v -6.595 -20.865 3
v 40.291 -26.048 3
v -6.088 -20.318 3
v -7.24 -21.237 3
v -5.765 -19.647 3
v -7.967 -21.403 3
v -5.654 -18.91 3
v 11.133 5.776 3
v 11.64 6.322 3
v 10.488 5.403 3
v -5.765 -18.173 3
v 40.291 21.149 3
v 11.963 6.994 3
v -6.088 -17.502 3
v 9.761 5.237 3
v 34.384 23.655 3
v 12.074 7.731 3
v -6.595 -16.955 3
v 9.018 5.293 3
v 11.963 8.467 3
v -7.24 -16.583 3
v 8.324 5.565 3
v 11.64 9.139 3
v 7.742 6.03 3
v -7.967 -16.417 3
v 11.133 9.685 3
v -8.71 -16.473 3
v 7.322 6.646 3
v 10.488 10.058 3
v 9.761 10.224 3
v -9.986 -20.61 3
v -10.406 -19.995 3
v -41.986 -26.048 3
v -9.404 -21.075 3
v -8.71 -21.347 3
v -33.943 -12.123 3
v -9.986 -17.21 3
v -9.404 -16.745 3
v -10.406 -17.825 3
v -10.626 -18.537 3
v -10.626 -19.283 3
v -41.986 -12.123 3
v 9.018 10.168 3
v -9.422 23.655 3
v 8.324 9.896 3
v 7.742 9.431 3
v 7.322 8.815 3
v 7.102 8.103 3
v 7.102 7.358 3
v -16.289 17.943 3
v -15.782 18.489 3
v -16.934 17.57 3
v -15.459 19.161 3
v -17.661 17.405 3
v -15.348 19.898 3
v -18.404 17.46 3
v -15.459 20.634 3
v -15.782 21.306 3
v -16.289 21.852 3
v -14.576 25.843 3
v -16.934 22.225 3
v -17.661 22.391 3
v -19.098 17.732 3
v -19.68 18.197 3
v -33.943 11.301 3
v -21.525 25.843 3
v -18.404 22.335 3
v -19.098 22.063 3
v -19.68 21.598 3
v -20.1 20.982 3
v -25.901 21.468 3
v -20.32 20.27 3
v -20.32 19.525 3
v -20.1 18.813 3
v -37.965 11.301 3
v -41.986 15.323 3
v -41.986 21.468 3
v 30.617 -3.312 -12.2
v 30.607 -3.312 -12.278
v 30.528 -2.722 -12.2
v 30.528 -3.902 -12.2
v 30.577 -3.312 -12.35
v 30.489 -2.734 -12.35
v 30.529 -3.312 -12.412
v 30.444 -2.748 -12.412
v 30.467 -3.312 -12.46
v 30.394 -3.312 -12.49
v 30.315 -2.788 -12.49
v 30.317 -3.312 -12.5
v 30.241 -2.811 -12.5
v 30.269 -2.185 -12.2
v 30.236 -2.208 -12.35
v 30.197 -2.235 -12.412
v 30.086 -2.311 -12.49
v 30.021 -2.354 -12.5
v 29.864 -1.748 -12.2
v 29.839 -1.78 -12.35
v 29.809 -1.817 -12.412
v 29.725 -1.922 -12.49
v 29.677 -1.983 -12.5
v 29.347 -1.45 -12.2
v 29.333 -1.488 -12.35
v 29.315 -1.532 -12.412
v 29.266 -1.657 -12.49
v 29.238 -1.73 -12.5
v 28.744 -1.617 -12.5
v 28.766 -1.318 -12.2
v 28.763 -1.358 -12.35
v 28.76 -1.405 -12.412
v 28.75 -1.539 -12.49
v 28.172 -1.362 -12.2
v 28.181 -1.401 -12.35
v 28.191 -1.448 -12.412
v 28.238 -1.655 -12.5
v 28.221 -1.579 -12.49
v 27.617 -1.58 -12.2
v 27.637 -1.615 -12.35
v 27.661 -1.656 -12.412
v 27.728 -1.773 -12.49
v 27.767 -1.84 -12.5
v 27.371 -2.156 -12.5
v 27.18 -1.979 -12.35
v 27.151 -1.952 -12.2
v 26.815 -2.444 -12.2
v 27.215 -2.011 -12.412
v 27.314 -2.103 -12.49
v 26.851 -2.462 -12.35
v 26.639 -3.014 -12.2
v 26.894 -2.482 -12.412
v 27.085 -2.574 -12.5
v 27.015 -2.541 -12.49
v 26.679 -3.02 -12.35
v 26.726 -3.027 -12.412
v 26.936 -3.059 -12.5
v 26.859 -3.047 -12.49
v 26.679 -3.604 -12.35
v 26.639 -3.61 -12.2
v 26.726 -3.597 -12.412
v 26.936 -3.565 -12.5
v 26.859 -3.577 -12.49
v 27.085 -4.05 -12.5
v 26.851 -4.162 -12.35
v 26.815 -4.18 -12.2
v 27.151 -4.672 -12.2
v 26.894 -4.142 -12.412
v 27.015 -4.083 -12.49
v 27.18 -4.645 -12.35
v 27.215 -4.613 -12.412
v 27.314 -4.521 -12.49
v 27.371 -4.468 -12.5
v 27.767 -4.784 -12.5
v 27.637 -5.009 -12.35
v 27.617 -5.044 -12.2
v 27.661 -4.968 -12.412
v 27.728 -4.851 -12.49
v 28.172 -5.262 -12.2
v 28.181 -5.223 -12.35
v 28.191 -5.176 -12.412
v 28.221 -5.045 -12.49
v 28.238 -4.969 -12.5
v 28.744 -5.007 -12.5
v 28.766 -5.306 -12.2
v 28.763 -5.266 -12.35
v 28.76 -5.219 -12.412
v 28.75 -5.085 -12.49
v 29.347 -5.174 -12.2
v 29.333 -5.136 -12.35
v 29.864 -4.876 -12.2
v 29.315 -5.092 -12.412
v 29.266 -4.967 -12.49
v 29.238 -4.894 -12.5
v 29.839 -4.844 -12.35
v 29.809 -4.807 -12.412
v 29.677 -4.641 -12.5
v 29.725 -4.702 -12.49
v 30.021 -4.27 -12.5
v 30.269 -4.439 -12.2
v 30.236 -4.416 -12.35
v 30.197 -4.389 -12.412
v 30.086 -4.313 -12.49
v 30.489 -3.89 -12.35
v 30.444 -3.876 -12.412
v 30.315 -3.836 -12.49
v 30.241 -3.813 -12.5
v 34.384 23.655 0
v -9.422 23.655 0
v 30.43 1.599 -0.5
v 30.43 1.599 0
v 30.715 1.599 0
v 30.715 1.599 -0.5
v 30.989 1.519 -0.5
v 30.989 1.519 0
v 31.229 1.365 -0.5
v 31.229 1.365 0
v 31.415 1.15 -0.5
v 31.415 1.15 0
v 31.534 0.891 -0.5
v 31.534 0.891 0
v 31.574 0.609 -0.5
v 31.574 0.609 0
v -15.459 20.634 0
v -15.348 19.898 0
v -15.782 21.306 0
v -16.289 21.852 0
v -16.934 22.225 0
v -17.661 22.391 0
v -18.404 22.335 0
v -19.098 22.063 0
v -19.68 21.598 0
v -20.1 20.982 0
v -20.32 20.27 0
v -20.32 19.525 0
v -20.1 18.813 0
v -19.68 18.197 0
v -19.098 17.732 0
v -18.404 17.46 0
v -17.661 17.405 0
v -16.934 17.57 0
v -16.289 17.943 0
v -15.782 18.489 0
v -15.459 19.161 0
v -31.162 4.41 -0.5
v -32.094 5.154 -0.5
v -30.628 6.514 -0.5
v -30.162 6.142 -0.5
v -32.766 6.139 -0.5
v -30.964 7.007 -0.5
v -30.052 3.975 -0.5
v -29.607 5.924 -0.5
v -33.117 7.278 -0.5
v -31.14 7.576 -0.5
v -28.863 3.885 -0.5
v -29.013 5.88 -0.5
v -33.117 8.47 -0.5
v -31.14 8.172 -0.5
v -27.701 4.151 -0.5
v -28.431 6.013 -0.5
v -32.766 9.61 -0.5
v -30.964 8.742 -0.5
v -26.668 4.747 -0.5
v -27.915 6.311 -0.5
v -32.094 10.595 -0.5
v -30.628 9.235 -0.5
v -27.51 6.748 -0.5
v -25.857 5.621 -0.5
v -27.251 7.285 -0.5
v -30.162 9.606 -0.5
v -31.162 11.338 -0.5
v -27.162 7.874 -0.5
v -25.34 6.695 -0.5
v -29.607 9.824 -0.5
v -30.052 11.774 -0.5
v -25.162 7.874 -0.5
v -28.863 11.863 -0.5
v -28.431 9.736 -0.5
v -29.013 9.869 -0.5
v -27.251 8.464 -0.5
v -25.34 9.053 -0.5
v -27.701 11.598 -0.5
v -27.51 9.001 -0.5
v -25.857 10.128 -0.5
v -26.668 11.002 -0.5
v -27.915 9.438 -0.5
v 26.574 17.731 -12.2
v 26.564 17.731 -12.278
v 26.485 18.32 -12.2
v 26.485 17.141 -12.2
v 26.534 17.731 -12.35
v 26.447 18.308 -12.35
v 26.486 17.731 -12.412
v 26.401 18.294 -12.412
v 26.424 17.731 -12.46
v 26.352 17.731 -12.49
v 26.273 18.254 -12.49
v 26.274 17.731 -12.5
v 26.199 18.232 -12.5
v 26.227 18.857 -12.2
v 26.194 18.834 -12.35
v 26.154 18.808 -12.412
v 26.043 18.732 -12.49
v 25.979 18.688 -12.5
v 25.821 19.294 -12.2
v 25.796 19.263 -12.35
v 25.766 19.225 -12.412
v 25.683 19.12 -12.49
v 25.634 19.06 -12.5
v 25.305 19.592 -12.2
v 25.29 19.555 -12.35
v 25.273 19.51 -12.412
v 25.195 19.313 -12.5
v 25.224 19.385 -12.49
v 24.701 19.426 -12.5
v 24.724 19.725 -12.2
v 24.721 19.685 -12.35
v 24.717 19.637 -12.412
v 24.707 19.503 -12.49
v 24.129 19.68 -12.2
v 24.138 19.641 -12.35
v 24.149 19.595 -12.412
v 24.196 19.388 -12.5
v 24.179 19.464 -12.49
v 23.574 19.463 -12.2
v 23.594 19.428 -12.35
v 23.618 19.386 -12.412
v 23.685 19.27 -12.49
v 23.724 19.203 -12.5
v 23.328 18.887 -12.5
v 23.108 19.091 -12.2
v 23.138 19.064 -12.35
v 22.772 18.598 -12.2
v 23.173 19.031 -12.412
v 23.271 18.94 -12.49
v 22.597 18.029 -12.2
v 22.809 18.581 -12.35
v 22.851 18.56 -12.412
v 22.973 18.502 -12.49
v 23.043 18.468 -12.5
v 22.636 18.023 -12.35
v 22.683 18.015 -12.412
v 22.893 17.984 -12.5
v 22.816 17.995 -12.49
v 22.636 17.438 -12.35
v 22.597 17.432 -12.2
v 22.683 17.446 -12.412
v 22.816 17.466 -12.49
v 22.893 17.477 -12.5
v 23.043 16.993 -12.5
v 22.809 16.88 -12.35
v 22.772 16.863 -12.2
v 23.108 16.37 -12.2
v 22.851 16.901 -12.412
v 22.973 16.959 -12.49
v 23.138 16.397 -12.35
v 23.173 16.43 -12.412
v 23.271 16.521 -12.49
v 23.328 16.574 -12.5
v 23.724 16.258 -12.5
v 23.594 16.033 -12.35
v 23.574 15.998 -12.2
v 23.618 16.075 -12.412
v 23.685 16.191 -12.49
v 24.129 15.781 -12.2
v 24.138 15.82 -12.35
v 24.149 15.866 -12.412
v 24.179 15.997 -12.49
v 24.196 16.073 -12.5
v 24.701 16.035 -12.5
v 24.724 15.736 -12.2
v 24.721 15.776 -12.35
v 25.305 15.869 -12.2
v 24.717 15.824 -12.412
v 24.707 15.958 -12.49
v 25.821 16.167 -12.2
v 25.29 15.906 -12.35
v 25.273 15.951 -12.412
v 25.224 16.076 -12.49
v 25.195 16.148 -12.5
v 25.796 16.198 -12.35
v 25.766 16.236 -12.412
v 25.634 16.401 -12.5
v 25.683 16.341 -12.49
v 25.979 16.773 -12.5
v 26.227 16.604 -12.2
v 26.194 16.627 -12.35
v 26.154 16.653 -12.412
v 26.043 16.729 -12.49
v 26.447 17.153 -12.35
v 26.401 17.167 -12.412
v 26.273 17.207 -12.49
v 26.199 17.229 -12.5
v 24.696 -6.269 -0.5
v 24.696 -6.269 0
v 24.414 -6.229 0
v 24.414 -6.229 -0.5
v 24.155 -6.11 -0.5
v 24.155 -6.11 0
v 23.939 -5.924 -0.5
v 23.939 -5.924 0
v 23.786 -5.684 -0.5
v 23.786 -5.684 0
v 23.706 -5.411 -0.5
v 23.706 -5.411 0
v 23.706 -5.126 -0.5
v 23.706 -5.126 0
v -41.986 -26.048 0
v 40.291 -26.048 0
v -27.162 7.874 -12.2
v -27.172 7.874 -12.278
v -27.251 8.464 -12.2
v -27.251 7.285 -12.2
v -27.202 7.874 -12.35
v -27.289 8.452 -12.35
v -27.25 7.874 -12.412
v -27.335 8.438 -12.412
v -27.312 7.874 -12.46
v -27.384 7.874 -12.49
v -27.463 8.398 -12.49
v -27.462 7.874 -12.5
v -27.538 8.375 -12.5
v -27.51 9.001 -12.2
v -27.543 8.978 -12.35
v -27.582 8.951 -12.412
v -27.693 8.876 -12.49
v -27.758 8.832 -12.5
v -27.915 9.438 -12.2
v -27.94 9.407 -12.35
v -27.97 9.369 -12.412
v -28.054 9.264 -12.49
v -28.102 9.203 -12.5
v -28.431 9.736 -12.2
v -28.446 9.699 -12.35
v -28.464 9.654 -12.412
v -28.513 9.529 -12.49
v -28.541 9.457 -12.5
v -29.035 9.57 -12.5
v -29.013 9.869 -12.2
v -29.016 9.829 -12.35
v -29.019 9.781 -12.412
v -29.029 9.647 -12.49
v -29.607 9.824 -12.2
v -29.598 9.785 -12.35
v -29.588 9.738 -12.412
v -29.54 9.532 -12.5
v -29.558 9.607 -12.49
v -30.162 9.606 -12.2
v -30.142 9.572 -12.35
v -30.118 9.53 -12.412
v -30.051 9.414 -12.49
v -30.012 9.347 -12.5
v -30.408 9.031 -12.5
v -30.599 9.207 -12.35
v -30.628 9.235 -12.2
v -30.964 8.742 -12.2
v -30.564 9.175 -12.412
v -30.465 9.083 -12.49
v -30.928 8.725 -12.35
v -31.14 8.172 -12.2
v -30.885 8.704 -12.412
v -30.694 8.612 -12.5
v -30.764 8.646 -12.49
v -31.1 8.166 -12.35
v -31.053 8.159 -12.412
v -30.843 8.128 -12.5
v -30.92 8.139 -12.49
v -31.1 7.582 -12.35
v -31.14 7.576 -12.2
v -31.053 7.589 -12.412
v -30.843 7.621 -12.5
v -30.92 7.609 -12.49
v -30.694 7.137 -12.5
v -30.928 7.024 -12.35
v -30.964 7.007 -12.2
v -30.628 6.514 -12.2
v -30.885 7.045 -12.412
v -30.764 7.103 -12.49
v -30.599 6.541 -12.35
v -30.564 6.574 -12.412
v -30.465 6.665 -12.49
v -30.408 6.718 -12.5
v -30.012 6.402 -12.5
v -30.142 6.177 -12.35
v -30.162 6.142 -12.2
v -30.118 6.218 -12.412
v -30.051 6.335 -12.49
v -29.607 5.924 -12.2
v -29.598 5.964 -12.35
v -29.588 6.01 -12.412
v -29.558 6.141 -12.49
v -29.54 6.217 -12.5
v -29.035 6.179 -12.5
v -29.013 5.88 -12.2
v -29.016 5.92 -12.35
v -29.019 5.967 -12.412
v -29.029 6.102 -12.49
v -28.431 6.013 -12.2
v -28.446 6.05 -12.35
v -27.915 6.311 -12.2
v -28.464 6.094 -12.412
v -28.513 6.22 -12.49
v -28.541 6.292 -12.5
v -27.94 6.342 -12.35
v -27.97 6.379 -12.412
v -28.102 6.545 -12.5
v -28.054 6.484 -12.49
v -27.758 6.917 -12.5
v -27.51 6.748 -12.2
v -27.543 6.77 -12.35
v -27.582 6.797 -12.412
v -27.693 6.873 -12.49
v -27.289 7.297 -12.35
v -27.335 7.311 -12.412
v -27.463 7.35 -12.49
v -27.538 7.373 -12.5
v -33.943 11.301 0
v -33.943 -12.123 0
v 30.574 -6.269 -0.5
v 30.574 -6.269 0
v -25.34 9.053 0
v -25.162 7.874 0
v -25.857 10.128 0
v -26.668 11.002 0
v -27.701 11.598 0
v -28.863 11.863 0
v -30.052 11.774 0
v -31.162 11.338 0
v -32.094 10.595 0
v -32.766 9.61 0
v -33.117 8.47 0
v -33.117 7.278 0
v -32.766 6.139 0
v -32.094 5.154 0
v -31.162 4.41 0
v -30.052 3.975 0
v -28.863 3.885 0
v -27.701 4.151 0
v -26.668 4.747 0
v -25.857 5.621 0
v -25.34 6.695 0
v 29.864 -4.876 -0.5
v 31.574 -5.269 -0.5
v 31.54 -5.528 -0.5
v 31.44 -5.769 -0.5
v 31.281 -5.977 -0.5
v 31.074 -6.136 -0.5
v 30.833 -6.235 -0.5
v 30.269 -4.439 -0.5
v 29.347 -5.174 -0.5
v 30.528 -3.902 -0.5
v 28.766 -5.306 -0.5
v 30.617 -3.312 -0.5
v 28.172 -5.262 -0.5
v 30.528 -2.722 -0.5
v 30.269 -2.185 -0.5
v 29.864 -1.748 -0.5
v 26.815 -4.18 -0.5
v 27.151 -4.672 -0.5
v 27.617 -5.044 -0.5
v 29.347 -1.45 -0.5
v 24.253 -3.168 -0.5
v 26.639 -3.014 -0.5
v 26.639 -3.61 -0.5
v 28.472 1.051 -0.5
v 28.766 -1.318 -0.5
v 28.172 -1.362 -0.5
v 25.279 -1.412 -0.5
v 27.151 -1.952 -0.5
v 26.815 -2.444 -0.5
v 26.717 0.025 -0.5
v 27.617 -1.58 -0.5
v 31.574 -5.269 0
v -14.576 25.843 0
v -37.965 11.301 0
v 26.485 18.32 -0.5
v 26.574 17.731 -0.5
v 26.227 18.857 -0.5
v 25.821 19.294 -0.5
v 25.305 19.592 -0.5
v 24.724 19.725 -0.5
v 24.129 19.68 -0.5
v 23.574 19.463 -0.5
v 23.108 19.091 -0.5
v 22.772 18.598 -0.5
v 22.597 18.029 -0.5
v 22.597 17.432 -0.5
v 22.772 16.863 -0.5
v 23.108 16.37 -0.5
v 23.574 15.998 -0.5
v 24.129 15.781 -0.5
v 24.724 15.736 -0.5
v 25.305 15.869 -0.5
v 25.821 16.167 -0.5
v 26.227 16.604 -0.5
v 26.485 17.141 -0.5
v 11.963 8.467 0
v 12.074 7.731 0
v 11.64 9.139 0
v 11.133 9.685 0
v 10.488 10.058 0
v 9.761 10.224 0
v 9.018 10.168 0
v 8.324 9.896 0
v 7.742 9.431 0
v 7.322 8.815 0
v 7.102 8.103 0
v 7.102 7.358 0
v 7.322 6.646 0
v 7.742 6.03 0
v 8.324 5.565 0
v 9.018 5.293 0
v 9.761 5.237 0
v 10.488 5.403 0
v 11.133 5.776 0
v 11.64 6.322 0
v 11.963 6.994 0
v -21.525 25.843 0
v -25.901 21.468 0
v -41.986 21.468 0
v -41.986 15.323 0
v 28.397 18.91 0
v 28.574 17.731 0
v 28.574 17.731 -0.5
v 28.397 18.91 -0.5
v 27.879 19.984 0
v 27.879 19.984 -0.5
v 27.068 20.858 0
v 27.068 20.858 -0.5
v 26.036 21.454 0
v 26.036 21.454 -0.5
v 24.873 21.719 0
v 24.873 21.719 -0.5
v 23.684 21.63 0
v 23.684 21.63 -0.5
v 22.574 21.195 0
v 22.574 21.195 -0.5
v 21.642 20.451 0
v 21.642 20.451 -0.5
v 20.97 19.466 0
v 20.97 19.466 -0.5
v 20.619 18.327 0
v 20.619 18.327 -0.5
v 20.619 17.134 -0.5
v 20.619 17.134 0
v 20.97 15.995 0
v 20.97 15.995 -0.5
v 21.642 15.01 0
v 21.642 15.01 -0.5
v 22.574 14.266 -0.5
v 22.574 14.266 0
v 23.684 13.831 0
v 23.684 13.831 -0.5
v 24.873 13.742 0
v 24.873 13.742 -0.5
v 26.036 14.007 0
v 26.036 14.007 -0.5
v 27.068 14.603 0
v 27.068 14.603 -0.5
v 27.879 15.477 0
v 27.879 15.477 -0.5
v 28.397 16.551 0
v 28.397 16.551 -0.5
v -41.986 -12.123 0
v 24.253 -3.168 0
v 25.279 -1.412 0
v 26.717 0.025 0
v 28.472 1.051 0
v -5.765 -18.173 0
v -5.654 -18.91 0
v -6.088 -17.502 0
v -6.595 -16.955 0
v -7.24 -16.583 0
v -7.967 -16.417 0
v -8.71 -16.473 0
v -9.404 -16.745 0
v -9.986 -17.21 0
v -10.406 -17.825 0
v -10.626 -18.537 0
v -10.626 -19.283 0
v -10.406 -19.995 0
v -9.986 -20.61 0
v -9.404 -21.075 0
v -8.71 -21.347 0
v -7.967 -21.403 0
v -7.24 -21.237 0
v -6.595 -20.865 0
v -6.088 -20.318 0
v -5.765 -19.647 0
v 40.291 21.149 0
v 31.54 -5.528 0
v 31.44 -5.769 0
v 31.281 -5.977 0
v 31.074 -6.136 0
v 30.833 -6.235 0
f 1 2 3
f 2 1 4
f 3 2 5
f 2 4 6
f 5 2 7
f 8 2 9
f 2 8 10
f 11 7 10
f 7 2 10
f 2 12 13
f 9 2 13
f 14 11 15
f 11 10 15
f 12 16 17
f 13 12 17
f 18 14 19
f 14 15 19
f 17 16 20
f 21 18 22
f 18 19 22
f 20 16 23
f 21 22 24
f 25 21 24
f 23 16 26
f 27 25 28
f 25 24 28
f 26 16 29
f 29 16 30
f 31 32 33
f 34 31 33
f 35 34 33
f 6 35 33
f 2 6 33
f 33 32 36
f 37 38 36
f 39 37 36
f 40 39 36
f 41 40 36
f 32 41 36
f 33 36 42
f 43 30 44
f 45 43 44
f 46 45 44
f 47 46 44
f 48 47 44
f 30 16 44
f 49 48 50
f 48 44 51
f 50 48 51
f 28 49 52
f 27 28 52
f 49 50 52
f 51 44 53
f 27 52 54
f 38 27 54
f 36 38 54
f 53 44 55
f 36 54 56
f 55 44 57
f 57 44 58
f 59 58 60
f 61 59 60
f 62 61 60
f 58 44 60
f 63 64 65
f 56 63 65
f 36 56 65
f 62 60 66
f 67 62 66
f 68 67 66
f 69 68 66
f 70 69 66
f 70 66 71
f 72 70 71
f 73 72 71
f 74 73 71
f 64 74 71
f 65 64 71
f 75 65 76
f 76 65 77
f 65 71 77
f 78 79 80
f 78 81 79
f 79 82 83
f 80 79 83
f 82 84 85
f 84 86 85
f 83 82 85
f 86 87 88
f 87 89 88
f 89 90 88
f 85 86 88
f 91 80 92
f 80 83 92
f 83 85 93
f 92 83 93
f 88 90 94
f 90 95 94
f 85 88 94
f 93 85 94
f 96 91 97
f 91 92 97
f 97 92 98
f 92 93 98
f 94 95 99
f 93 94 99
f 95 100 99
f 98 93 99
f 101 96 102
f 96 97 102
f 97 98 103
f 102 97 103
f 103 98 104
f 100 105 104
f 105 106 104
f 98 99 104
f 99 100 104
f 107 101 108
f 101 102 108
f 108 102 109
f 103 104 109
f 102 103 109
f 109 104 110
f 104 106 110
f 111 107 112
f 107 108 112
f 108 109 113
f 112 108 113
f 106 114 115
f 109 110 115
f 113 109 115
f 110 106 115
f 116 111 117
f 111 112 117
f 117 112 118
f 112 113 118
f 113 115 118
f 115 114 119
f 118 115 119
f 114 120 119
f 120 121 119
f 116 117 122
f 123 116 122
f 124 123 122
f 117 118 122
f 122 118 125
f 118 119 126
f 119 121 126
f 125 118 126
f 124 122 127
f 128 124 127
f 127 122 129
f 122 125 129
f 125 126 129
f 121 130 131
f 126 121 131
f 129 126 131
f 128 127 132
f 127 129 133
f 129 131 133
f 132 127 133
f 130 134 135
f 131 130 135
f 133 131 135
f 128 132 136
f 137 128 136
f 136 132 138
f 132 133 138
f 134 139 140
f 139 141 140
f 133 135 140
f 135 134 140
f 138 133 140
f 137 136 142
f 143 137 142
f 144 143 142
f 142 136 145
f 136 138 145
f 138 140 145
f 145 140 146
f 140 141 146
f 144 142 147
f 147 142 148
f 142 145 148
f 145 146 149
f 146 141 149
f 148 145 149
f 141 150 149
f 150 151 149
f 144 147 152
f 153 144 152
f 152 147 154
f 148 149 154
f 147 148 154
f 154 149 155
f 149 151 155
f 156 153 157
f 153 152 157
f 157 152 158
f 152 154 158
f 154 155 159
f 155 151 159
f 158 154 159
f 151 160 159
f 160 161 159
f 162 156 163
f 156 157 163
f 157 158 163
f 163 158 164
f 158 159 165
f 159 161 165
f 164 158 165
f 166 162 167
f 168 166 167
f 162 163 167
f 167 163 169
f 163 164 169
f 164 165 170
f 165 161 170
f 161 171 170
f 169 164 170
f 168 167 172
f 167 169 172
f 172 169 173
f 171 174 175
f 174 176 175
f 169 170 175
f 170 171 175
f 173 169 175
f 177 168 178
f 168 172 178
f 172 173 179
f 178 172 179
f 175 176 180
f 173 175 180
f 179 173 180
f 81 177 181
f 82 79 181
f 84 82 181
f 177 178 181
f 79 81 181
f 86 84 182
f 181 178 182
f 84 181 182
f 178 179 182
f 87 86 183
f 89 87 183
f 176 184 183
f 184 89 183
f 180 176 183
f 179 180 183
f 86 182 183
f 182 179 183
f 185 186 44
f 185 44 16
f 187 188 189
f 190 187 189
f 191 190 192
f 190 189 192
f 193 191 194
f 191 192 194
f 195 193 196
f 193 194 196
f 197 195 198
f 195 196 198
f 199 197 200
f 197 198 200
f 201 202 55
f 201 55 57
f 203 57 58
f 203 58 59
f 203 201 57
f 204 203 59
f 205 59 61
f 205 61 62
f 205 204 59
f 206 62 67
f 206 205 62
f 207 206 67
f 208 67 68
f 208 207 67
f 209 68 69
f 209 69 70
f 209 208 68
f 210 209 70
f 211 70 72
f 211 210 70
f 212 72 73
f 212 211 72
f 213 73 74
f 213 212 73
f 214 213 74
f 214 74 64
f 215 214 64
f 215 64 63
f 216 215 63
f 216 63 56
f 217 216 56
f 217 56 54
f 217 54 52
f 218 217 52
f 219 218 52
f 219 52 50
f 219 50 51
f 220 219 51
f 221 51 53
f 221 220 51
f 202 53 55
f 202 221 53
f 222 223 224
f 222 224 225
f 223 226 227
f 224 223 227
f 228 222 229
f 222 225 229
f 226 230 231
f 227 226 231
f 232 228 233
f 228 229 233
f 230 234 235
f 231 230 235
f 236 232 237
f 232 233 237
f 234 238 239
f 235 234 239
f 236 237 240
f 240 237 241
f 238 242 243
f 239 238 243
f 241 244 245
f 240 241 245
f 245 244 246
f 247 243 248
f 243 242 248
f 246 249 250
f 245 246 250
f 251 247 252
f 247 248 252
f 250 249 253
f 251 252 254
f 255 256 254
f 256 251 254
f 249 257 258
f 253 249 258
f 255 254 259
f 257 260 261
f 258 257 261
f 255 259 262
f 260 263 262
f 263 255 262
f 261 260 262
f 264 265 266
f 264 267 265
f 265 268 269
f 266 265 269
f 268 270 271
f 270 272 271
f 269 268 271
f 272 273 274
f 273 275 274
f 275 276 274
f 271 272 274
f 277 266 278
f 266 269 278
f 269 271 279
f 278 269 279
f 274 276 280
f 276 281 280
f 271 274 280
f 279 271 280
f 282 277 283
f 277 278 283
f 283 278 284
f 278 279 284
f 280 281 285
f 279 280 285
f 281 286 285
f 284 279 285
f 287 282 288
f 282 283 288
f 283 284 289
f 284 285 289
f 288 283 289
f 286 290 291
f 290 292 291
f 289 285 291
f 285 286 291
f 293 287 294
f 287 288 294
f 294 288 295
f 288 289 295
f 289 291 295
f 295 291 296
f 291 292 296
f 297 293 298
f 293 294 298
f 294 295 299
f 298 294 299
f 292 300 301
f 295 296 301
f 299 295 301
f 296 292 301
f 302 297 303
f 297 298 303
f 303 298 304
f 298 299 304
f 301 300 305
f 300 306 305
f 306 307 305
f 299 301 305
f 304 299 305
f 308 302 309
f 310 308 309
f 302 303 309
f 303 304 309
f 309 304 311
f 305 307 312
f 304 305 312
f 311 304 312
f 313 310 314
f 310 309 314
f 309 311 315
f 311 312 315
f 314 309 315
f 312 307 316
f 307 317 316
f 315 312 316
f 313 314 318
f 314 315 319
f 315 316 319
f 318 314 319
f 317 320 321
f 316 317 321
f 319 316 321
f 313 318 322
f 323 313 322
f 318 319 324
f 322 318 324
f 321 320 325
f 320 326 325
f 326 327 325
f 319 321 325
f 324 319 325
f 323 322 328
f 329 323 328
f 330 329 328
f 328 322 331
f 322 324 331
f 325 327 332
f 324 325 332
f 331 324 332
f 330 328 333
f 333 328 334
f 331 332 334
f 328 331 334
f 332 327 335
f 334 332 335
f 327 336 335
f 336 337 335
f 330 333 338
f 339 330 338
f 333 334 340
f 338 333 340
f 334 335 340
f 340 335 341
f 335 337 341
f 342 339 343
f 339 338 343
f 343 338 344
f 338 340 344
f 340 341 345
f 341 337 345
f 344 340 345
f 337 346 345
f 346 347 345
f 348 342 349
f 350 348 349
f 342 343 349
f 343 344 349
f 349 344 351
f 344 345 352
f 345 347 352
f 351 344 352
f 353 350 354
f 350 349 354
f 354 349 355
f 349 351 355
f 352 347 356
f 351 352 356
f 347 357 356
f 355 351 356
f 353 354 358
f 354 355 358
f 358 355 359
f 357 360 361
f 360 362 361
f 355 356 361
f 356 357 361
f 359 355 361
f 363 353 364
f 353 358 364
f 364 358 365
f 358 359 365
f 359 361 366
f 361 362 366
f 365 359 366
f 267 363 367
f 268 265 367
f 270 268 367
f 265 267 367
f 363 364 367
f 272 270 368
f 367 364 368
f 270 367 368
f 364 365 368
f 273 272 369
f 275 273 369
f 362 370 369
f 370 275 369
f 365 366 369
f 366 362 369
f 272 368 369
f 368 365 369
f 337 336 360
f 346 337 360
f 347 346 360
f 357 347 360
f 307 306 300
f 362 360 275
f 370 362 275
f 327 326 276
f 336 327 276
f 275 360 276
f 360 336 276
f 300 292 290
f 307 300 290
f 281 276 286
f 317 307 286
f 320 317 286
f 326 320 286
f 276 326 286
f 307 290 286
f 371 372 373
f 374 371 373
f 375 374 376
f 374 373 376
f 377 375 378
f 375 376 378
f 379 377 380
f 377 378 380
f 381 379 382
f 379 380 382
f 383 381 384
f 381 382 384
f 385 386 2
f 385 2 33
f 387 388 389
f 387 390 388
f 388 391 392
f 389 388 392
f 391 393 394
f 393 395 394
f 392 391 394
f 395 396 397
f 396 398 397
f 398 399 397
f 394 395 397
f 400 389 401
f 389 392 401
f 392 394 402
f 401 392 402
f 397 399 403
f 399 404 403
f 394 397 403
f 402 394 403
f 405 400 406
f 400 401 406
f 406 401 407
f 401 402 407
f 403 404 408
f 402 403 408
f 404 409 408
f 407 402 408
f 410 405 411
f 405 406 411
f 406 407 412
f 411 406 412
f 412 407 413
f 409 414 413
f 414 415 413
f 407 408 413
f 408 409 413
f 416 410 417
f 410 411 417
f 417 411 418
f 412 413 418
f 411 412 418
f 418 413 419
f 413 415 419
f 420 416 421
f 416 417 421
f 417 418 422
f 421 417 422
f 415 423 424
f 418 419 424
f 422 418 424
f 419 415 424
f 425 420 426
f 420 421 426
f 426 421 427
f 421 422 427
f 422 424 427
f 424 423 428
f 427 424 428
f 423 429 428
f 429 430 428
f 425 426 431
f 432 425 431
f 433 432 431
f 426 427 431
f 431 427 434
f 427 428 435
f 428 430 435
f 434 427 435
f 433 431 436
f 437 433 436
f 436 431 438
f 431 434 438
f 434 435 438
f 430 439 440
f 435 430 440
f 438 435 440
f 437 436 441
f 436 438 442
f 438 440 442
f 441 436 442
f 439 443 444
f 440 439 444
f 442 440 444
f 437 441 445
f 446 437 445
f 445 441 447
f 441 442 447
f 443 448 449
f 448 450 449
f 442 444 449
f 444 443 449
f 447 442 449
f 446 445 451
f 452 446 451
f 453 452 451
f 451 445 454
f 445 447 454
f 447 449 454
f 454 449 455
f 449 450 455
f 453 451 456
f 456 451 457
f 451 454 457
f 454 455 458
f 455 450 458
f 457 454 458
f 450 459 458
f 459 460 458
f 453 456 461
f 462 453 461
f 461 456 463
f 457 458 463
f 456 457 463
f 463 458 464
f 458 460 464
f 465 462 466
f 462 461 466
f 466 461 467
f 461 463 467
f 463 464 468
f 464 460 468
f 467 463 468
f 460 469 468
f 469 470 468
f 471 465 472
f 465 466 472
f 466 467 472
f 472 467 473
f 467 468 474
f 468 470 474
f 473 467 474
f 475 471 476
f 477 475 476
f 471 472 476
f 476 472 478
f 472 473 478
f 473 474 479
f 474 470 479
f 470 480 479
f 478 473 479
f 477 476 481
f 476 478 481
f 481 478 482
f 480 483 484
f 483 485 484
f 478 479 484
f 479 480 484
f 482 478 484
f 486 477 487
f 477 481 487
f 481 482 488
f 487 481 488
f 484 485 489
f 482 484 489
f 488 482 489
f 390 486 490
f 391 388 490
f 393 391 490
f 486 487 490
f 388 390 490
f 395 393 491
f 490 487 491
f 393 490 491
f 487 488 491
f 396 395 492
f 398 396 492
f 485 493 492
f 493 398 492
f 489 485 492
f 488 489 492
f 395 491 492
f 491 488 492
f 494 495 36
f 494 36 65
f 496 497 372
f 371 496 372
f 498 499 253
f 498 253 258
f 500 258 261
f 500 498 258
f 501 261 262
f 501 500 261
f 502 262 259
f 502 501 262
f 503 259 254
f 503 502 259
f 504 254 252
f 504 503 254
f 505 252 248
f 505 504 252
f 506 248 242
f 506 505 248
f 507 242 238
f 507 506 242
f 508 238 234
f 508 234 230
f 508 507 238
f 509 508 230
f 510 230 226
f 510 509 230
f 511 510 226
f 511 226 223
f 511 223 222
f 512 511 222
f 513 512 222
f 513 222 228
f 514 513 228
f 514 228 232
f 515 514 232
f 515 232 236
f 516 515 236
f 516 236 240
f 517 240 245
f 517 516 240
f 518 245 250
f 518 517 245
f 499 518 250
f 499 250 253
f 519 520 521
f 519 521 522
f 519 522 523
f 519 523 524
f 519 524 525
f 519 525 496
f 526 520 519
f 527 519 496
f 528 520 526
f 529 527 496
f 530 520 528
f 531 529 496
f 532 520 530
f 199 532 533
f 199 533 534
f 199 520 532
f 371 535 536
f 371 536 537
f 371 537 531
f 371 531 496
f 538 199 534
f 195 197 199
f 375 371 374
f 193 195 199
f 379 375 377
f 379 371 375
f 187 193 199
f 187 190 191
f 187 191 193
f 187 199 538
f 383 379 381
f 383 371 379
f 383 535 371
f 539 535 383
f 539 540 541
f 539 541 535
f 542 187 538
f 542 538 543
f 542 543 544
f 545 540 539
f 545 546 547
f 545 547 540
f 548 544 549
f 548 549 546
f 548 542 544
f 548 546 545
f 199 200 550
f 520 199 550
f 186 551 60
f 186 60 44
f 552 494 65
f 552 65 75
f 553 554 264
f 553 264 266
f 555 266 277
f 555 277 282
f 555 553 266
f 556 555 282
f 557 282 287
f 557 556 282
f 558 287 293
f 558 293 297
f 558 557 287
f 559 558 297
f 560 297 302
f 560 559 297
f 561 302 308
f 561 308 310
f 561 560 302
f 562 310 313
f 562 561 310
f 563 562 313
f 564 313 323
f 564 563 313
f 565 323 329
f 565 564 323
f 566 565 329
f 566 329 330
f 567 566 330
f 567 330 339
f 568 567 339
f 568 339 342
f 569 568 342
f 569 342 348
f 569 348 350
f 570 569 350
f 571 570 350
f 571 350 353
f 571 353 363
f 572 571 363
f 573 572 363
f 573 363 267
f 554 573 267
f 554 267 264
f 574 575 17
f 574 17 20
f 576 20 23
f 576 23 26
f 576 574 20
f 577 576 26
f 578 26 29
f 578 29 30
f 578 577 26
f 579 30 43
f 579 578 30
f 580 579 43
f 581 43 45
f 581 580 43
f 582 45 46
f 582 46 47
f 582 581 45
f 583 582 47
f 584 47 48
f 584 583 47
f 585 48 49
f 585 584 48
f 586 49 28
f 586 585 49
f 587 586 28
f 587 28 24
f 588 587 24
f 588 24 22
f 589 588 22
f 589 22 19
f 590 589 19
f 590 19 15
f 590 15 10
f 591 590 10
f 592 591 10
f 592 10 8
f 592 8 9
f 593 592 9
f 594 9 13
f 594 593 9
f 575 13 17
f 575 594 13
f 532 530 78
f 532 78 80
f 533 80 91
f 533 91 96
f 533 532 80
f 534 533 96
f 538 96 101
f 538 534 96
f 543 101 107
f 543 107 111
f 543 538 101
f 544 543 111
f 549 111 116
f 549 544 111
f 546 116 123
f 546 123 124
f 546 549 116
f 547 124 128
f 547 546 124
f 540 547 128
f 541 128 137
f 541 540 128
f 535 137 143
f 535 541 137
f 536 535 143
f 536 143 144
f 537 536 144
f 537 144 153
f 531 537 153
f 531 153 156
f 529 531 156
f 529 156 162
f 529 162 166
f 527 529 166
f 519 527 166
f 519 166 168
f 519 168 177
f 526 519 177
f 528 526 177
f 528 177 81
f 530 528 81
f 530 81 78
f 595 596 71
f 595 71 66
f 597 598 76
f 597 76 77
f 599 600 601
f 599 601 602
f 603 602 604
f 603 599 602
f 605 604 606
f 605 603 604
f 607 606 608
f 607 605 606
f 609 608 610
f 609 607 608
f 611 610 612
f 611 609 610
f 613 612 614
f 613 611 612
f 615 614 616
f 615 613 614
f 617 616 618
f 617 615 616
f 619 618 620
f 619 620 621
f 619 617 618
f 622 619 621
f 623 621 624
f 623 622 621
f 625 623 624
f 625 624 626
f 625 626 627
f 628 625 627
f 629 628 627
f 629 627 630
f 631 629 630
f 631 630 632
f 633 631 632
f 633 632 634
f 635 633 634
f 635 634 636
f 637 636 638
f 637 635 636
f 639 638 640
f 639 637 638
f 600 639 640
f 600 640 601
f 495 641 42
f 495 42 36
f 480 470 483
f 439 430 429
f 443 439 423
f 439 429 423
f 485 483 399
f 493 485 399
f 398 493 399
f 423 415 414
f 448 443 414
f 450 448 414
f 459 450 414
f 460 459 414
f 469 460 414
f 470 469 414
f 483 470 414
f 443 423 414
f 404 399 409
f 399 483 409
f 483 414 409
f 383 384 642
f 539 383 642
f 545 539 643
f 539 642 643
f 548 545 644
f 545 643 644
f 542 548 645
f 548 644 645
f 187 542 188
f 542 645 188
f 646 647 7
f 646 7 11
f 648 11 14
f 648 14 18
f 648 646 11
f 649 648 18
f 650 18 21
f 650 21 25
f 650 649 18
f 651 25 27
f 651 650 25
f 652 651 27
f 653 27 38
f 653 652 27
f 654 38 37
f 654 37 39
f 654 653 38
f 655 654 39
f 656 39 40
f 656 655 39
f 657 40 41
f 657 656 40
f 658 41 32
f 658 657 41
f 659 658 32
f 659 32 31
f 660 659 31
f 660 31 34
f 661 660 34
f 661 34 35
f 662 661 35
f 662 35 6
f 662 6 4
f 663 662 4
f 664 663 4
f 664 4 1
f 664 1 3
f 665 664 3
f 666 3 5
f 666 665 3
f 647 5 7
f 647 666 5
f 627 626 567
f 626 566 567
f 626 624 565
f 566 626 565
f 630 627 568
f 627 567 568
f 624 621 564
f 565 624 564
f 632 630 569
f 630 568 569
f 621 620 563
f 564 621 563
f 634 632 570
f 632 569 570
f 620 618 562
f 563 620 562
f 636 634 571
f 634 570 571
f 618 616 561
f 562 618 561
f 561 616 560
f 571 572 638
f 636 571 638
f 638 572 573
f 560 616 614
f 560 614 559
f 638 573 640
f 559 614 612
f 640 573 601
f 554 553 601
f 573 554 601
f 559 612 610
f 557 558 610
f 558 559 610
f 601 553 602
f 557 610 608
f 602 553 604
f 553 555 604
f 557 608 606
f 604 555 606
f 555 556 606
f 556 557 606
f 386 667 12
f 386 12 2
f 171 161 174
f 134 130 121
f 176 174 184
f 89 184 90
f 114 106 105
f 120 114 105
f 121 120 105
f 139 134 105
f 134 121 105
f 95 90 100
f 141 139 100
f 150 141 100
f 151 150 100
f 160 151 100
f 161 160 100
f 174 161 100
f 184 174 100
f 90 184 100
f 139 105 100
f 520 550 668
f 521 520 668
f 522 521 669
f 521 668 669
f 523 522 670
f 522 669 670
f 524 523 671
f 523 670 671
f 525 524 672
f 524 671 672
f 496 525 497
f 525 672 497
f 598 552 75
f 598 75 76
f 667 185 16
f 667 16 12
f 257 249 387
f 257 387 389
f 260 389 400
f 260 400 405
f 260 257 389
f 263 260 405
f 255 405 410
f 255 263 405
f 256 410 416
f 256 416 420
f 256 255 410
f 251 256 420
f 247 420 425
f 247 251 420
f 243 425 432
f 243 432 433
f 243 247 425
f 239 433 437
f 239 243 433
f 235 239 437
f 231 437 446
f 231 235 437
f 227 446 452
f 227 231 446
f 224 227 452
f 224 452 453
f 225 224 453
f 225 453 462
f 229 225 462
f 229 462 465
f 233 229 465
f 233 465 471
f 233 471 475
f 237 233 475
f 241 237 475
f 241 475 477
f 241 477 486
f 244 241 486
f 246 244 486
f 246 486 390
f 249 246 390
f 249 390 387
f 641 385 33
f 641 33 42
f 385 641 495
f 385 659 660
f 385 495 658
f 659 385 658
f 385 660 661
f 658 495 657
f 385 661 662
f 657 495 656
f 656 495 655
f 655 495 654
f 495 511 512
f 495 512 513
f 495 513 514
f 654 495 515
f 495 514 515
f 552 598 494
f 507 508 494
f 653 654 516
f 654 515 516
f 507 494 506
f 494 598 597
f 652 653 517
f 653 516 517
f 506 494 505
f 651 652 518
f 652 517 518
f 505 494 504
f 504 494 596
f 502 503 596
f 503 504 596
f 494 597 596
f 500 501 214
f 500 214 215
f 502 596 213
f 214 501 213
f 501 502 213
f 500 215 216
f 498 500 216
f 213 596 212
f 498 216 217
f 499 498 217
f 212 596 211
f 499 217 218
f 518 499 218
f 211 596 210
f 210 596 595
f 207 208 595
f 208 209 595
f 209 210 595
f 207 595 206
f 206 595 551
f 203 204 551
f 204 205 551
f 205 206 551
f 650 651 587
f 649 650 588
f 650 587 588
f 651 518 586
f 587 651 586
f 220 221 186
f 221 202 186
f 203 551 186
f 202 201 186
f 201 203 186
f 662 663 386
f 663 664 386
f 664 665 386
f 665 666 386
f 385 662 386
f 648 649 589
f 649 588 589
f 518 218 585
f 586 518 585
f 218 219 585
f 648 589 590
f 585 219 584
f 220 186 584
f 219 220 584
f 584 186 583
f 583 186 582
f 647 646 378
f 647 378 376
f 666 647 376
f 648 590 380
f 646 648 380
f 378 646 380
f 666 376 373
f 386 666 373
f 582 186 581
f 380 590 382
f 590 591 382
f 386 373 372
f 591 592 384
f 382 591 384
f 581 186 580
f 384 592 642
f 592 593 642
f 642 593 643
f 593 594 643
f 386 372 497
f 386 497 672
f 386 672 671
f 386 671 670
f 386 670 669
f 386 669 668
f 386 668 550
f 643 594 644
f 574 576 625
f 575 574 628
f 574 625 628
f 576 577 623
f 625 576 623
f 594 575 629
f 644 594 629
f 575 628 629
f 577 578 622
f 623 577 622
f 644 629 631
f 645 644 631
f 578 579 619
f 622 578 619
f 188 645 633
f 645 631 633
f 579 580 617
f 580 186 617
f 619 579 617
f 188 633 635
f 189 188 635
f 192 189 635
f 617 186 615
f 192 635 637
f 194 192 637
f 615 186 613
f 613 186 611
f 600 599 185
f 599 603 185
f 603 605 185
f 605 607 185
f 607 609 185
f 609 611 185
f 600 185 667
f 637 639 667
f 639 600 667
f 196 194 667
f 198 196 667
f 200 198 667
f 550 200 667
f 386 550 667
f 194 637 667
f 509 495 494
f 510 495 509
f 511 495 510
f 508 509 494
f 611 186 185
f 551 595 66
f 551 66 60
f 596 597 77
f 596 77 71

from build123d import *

# Parameters (mm, degrees)
SKETCH_2_R       = 2.5
EXTRUDE_11_DEPTH = 3
SKETCH_2_16_R    = 2
SKETCH_2_16_R_2  = 4
EXTRUDE_12_DEPTH = 0.5
SKETCH_2_17_R    = 2
EXTRUDE_13_DEPTH = 12.5
FILLET_1_R       = 0.3


with BuildPart() as part:
    # 스케치2 → 보스-돌출11 (new body)
    with BuildSketch(Plane.XY):
        Polygon((-25.900833035, 21.467672234), (-41.985987982, 21.467672234), (-41.985987982, 15.322651266), (-37.964699246, 11.301362529), (-33.943410509, 11.301362529), (-33.943410509, -12.123358681), (-41.985987982, -12.123358681), (-41.985987982, -26.048068749), (40.290588771, -26.048068749), (40.290588771, 21.148605879), (34.384238258, 23.655411353), (-9.421808725, 23.655411353), (-14.576398582, 25.843150472), (-21.525354797, 25.843150472), align=None)
        with Locations((-8.153758739, -18.910029411)):
            Circle(SKETCH_2_R, mode=Mode.SUBTRACT)
        with Locations((-17.847699606, 19.897540861)):
            Circle(SKETCH_2_R, mode=Mode.SUBTRACT)
        with Locations((9.574246485, 7.73050044)):
            Circle(SKETCH_2_R, mode=Mode.SUBTRACT)
    extrude(amount=EXTRUDE_11_DEPTH)

    # 스케치2<16> → 보스-돌출12 (add)
    # profile 1 of 3: a face of its own
    with BuildSketch(Plane.XY):
        with BuildLine():
            ThreePointArc((23.706105599, -5.125632338), (23.939439675, -5.923767386), (24.695702599, -6.26949956))
            Line((24.695702599, -6.26949956), (30.574246485, -6.26949956))
            ThreePointArc((30.574246485, -6.26949956), (31.281353266, -5.976606341), (31.574246485, -5.26949956))
            Line((31.574246485, -5.26949956), (31.574246485, 0.609044326))
            ThreePointArc((31.574246485, 0.609044326), (31.228514311, 1.365307251), (30.430379263, 1.598641326))
            ThreePointArc((30.430379263, 1.598641326), (25.952143977, -0.647397052), (23.706105599, -5.125632338))
        make_face()
        with Locations((28.616748621, -3.312001696)):
            Circle(SKETCH_2_16_R, mode=Mode.SUBTRACT)
    # profile 2 of 3: a face of its own
    with BuildSketch(Plane.XY):
        with Locations((-29.162107176, 7.874269984)):
            Circle(SKETCH_2_16_R_2)
        with Locations((-29.162107176, 7.874269984)):
            Circle(SKETCH_2_16_R, mode=Mode.SUBTRACT)
    # profile 3 of 3: a face of its own
    with BuildSketch(Plane.XY):
        with Locations((24.574246485, 17.73050044)):
            Circle(SKETCH_2_16_R_2)
        with Locations((24.574246485, 17.73050044)):
            Circle(SKETCH_2_16_R, mode=Mode.SUBTRACT)
    extrude(amount=-EXTRUDE_12_DEPTH)

    # 스케치2<17> → 보스-돌출13 (add)
    with BuildSketch(Plane.XY):
        with Locations((-29.162107176, 7.874269984)):
            Circle(SKETCH_2_17_R)
        with Locations((24.574246485, 17.73050044)):
            Circle(SKETCH_2_17_R)
        with Locations((28.616748621, -3.312001696)):
            Circle(SKETCH_2_17_R)
    extrude(amount=-EXTRUDE_13_DEPTH)

    # 필렛1
    fillet_1_edges = [part.edges().sort_by_distance(p)[0] for p in [
        (26.616748621, -3.312001696, -12.5),
        (22.574246485, 17.73050044, -12.5),
        (-31.162107176, 7.874269984, -12.5),
    ]]
    fillet(fillet_1_edges, radius=FILLET_1_R)


solid = part.part
